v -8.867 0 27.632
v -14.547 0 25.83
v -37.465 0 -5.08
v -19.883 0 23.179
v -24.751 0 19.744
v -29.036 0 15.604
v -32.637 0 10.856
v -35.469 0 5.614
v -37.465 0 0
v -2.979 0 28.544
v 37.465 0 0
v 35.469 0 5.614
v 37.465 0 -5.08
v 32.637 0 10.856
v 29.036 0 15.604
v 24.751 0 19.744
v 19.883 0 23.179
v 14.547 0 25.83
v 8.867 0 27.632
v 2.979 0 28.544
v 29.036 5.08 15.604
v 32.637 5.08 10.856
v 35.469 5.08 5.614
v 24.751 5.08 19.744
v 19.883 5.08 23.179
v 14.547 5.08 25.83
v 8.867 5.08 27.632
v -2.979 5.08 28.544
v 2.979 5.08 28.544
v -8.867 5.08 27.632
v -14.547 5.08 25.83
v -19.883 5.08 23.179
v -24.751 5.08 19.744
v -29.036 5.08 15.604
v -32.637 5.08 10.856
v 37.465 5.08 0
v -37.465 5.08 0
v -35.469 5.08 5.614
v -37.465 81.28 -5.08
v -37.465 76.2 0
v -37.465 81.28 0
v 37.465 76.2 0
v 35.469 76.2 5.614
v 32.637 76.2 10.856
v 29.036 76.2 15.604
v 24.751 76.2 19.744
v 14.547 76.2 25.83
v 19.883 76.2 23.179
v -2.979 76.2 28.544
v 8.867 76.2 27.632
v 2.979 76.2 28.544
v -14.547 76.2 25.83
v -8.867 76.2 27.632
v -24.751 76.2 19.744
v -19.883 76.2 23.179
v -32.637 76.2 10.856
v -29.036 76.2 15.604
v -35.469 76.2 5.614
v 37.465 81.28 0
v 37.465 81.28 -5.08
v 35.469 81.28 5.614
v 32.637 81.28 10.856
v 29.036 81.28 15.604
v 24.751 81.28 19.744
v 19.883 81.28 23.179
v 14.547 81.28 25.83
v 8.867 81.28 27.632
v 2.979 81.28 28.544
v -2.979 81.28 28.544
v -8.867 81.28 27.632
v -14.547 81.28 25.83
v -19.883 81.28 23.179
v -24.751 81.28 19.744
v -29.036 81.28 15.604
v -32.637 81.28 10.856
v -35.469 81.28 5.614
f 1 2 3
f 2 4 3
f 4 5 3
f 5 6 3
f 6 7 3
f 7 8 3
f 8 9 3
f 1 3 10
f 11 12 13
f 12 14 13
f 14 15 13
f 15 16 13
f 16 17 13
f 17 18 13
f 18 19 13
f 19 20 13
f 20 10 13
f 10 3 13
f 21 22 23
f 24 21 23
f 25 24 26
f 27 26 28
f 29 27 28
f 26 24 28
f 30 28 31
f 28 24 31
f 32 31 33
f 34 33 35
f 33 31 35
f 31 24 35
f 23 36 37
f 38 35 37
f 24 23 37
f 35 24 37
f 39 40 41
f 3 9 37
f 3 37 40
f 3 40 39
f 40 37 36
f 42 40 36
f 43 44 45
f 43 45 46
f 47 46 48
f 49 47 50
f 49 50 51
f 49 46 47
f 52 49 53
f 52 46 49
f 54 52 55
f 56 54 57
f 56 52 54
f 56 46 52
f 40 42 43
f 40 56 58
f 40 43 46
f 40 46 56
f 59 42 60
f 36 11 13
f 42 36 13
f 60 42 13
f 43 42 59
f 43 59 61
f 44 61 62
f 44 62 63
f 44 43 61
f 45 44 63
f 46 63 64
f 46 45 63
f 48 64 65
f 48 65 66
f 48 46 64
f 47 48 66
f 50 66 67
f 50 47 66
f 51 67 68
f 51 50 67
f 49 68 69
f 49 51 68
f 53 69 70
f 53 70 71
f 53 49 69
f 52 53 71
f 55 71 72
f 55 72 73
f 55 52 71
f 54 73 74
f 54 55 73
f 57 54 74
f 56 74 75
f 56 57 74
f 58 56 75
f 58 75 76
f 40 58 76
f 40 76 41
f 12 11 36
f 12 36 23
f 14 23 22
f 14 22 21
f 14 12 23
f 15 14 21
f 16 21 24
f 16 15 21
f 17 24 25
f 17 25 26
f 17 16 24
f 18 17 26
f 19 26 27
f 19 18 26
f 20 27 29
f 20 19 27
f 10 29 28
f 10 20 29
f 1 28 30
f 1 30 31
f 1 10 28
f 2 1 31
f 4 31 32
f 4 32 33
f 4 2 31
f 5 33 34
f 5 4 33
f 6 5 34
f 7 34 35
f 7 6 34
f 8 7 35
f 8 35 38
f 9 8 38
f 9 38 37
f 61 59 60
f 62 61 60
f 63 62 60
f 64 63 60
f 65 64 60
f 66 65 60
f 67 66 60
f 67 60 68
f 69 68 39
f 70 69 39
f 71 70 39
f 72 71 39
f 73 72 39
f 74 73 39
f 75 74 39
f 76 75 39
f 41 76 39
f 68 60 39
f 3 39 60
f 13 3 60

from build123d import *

# Parameters (mm, degrees)
BOSS_EXTRUDE1_DEPTH      = 5.08
BOSS_EXTRUDE2_DEPTH      = 76.2
BOSS_EXTRUDE2_DEPTH_BACK = 5.08
SKETCH3_W                = 74.93
SKETCH3_H                = 5.08
BOSS_EXTRUDE3_START      = -5.08
BOSS_EXTRUDE3_DEPTH      = 5.08


with BuildPart() as part:
    # Sketch2 → Boss-Extrude1 (new body)
    with BuildSketch(Plane(origin=(0, 0, 0), x_dir=(1, 0, 0), z_dir=(0, 1, 0))):
        with BuildLine():
            Line((-37.465, 0), (37.465, 0))
            ThreePointArc((37.465, 0), (0, -28.658189358), (-37.465, 0))
        make_face()
    extrude(amount=BOSS_EXTRUDE1_DEPTH)

    # Sketch3 → Boss-Extrude2 (add, two sides: drawn at the far end of the back side and taken through both)
    with BuildSketch(Plane(origin=(0, 5.08, 0), x_dir=(1, 0, 0), z_dir=(0, 1, 0)).offset(-BOSS_EXTRUDE2_DEPTH_BACK)):
        with Locations((0, 2.54)):
            Rectangle(SKETCH3_W, SKETCH3_H)
    extrude(amount=BOSS_EXTRUDE2_DEPTH + BOSS_EXTRUDE2_DEPTH_BACK)

    # Sketch4 → Boss-Extrude3 (add)
    with BuildSketch(Plane(origin=(0, 81.28, 0), x_dir=(1, 0, 0), z_dir=(0, 1, 0)).offset(BOSS_EXTRUDE3_START)):
        with BuildLine():
            Line((-37.465, 0), (37.465, 0))
            ThreePointArc((37.465, 0), (0, -28.658189358), (-37.465, 0))
        make_face()
    extrude(amount=BOSS_EXTRUDE3_DEPTH)


solid = part.part
